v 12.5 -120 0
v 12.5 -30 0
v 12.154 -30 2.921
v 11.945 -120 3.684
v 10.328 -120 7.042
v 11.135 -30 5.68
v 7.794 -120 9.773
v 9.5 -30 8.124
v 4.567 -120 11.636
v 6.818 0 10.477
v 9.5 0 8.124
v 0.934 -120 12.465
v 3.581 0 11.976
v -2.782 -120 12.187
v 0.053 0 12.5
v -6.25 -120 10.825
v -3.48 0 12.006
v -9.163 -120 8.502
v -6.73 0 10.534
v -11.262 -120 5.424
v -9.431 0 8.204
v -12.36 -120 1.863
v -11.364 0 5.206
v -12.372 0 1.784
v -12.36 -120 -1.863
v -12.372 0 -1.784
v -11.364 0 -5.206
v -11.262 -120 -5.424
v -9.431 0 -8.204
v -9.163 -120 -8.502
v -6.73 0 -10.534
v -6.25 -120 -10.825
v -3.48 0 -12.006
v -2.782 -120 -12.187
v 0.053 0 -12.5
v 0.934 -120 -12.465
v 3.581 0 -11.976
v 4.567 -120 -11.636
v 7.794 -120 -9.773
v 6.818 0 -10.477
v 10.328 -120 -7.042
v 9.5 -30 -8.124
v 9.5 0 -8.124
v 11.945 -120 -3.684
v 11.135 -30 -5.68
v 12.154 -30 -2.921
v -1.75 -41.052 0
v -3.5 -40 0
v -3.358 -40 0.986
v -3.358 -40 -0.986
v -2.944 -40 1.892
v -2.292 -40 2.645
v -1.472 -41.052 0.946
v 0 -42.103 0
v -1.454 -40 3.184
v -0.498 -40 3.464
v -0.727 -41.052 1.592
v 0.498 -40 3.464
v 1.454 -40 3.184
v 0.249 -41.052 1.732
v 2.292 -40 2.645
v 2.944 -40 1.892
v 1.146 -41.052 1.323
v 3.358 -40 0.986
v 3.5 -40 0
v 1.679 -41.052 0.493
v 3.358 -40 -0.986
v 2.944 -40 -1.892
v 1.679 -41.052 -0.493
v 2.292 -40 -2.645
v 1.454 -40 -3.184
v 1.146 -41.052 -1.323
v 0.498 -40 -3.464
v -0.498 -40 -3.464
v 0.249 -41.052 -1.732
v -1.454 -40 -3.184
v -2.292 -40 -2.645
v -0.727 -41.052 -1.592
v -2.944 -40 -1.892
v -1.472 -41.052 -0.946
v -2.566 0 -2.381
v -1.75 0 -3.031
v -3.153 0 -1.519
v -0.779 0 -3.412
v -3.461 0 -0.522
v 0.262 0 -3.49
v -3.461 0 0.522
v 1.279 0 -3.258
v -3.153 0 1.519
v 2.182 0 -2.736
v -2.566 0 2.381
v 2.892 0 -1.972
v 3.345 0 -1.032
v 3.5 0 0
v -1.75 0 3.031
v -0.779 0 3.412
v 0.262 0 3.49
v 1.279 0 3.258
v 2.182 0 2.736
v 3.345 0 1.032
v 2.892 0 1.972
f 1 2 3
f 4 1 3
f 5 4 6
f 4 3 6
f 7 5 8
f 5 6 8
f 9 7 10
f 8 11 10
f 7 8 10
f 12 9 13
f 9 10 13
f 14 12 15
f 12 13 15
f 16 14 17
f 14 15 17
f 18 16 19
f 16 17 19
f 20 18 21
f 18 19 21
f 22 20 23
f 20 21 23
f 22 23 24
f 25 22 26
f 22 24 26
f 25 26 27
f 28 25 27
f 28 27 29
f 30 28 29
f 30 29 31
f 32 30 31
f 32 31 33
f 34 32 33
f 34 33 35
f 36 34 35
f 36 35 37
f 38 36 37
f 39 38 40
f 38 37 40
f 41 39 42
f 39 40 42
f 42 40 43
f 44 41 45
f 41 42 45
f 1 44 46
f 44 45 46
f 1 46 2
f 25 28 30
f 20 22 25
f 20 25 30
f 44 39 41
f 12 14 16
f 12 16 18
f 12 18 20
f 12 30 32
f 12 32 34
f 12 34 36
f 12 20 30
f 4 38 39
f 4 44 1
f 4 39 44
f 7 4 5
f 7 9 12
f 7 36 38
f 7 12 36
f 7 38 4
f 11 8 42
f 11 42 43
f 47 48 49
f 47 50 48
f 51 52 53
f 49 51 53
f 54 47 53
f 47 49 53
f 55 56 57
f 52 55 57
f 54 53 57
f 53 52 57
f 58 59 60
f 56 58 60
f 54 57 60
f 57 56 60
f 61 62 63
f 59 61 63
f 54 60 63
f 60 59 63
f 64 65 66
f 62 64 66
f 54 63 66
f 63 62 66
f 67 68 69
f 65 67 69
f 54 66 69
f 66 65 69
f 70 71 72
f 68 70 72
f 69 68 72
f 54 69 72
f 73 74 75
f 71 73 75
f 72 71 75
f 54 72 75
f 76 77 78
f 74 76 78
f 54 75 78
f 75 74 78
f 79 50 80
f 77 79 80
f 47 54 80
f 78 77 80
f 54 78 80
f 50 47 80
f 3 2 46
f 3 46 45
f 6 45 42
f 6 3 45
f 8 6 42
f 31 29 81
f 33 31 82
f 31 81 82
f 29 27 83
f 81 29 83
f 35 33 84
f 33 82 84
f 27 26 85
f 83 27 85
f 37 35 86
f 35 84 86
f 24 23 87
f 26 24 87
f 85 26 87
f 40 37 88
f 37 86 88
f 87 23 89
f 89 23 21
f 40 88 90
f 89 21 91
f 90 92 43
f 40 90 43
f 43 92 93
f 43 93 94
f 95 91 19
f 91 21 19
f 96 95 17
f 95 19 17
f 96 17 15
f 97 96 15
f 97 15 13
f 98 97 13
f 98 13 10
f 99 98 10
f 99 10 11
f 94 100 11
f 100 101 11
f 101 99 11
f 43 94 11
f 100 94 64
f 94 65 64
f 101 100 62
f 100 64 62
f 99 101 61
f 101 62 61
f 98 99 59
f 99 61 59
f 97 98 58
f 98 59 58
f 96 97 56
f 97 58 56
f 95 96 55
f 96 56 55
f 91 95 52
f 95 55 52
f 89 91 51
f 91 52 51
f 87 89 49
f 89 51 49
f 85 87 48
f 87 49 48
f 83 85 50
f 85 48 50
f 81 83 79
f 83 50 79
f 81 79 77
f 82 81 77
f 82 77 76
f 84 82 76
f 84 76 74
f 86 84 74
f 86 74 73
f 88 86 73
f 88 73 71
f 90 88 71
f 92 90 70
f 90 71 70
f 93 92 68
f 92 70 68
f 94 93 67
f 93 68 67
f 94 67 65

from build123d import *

# Parameters (mm, degrees)
F0_R     = 12.5
F1_DEPTH = 120
F3_D     = 7
F3_DEPTH = 40
F3_TIP   = 2.1030121666
F5_W     = 30
F5_H     = 30.6473458186
F6_DEPTH = 3


with BuildPart() as f1:
    # F0 (on Front) → F1 (new body)
    with BuildSketch(Plane.XZ):
        Circle(F0_R)
    extrude(amount=F1_DEPTH)

    # F3
    with Locations(Plane(origin=(0, 0, 0), x_dir=(-1, 0, 0), z_dir=(0, 1, 0))):
        with Locations((0, 0)):
            Hole(F3_D / 2, depth=F3_DEPTH)
            with Locations((0, 0, -(F3_DEPTH + F3_TIP / 2))):  # 118° drill point
                Cone(0, F3_D / 2, F3_TIP, mode=Mode.SUBTRACT)

    # F5 (on offset) → F6 (cut)
    with BuildSketch(Plane.YZ.offset(12.5)):
        with Locations((-15, -0.2489075996)):
            Rectangle(F5_W, F5_H)
    extrude(amount=-F6_DEPTH, mode=Mode.SUBTRACT)


solid = f1.part
